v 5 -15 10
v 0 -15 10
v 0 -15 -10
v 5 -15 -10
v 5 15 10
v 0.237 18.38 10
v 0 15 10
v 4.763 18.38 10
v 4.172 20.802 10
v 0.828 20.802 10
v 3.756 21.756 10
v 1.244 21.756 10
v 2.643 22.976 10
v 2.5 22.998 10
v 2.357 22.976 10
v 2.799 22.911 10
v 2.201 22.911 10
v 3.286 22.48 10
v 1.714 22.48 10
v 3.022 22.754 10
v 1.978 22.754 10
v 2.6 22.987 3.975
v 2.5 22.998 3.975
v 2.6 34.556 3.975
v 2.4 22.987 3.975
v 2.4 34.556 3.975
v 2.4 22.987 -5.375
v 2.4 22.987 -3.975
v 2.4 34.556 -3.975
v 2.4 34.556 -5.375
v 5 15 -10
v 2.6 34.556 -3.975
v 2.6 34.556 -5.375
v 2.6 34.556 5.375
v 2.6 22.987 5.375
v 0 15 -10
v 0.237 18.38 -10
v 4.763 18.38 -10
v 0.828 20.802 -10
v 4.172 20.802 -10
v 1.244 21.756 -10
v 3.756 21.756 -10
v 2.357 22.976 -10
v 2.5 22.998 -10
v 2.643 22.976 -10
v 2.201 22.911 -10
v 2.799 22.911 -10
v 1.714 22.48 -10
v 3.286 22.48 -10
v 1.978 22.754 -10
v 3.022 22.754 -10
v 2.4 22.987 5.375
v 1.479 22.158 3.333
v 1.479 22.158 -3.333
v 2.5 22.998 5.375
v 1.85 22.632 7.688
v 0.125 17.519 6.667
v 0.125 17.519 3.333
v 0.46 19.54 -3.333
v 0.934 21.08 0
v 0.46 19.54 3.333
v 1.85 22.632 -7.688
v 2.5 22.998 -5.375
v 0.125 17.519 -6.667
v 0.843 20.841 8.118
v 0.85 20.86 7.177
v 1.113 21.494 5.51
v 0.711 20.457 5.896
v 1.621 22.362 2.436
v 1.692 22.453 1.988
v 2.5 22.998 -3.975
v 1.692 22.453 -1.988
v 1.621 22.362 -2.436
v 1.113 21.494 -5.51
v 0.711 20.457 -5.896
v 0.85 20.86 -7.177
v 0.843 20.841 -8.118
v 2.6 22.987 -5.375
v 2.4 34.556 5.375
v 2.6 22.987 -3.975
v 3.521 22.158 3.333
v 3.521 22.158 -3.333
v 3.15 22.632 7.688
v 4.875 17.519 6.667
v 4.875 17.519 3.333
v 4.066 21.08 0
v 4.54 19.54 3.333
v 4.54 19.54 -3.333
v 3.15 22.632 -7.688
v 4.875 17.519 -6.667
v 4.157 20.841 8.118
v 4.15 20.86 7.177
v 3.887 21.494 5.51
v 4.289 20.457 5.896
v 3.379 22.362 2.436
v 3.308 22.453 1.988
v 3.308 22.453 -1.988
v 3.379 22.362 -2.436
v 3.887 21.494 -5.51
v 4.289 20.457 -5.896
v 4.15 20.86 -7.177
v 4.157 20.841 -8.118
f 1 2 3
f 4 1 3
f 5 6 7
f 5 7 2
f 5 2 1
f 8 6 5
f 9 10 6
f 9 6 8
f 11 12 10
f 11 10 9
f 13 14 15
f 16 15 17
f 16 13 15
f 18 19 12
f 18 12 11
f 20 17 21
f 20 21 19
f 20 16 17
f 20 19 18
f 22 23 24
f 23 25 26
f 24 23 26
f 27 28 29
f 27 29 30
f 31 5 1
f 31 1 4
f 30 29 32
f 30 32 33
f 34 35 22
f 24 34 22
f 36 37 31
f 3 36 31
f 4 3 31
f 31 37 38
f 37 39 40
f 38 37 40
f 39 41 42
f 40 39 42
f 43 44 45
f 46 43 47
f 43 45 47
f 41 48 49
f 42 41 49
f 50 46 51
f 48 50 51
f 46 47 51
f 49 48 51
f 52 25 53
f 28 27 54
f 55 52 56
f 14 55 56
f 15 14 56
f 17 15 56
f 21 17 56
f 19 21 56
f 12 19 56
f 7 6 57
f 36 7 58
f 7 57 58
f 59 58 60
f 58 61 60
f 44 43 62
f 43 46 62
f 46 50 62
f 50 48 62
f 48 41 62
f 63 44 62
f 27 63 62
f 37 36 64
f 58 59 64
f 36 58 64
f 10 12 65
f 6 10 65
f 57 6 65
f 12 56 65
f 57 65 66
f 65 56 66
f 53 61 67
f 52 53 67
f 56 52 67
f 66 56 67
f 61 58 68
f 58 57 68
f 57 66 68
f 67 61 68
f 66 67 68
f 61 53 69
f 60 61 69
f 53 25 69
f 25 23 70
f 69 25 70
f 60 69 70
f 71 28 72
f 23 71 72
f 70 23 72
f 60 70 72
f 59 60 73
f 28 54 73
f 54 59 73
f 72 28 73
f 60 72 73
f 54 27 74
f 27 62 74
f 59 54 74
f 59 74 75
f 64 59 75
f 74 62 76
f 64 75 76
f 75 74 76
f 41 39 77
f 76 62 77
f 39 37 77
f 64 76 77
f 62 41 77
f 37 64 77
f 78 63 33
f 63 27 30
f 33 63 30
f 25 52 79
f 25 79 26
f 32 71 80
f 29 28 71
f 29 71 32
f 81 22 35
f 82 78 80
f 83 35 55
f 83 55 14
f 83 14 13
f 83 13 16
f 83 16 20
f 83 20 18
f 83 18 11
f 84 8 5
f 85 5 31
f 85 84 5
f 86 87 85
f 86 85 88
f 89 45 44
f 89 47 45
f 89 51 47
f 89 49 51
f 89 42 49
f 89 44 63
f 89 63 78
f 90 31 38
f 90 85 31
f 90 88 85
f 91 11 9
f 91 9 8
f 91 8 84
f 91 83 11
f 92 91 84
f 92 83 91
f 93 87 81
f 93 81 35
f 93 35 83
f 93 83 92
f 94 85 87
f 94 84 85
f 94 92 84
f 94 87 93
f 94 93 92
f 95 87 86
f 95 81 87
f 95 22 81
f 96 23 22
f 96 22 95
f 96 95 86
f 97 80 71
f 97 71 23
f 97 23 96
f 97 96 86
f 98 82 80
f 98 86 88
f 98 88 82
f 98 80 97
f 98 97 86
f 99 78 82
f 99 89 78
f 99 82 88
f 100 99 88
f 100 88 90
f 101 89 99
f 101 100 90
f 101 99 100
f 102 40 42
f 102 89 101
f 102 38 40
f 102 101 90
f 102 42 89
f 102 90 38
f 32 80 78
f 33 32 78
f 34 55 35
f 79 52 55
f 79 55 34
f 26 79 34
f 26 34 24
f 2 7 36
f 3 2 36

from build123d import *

# Parameters (mm, degrees)
SKETCH1_W                = 20
SKETCH1_H                = 30
BOSS_EXTRUDE1_DEPTH      = 5
BOSS_EXTRUDE2_DEPTH      = 10
BOSS_EXTRUDE2_DEPTH_BACK = 10
BOSS_EXTRUDE3_DEPTH      = 0.1
BOSS_EXTRUDE3_DEPTH_BACK = 0.1
SKETCH4_W                = 1.400067445
SKETCH4_H                = 17.511954704


with BuildPart() as part:
    # Sketch1 → Boss-Extrude1 (new body)
    with BuildSketch(Plane(origin=(0, 0, 0), x_dir=(0, 0, -1), z_dir=(1, 0, 0))):
        Rectangle(SKETCH1_W, SKETCH1_H)
    extrude(amount=BOSS_EXTRUDE1_DEPTH)

    # Sketch3 → Boss-Extrude2 (add, two sides: drawn at the far end of the back side and taken through both)
    with BuildSketch(Plane.XY.offset(-BOSS_EXTRUDE2_DEPTH_BACK)):
        with BuildLine():
            Line((0, 15), (5, 15))
            add(Edge.make_bspline(
                [(2.5, 22.997947181), (3.336578347, 22.9995894), (5.005761453, 20.548525939), (5, 15)],
                knots=[0, 0, 0, 0, 1, 1, 1, 1], degree=3))
            add(Edge.make_bspline(
                [(2.5, 22.997947181), (1.663421653, 22.9995894), (-0.005761453, 20.548525939), (0, 15)],
                knots=[0, 0, 0, 0, 1, 1, 1, 1], degree=3))
        make_face()
    extrude(amount=BOSS_EXTRUDE2_DEPTH + BOSS_EXTRUDE2_DEPTH_BACK)

    # Sketch4 → Boss-Extrude3 (add, two sides: drawn at the far end of the back side and taken through both)
    with BuildSketch(Plane(origin=(2.5, 0, 0), x_dir=(0, 0, -1), z_dir=(1, 0, 0)).offset(-BOSS_EXTRUDE3_DEPTH_BACK)):
        with Locations((4.675225217, 25.800434354)):
            Rectangle(SKETCH4_W, SKETCH4_H)
        with Locations((-4.675225217, 25.800434354)):
            Rectangle(SKETCH4_W, SKETCH4_H)
    extrude(amount=BOSS_EXTRUDE3_DEPTH + BOSS_EXTRUDE3_DEPTH_BACK)


solid = part.part
